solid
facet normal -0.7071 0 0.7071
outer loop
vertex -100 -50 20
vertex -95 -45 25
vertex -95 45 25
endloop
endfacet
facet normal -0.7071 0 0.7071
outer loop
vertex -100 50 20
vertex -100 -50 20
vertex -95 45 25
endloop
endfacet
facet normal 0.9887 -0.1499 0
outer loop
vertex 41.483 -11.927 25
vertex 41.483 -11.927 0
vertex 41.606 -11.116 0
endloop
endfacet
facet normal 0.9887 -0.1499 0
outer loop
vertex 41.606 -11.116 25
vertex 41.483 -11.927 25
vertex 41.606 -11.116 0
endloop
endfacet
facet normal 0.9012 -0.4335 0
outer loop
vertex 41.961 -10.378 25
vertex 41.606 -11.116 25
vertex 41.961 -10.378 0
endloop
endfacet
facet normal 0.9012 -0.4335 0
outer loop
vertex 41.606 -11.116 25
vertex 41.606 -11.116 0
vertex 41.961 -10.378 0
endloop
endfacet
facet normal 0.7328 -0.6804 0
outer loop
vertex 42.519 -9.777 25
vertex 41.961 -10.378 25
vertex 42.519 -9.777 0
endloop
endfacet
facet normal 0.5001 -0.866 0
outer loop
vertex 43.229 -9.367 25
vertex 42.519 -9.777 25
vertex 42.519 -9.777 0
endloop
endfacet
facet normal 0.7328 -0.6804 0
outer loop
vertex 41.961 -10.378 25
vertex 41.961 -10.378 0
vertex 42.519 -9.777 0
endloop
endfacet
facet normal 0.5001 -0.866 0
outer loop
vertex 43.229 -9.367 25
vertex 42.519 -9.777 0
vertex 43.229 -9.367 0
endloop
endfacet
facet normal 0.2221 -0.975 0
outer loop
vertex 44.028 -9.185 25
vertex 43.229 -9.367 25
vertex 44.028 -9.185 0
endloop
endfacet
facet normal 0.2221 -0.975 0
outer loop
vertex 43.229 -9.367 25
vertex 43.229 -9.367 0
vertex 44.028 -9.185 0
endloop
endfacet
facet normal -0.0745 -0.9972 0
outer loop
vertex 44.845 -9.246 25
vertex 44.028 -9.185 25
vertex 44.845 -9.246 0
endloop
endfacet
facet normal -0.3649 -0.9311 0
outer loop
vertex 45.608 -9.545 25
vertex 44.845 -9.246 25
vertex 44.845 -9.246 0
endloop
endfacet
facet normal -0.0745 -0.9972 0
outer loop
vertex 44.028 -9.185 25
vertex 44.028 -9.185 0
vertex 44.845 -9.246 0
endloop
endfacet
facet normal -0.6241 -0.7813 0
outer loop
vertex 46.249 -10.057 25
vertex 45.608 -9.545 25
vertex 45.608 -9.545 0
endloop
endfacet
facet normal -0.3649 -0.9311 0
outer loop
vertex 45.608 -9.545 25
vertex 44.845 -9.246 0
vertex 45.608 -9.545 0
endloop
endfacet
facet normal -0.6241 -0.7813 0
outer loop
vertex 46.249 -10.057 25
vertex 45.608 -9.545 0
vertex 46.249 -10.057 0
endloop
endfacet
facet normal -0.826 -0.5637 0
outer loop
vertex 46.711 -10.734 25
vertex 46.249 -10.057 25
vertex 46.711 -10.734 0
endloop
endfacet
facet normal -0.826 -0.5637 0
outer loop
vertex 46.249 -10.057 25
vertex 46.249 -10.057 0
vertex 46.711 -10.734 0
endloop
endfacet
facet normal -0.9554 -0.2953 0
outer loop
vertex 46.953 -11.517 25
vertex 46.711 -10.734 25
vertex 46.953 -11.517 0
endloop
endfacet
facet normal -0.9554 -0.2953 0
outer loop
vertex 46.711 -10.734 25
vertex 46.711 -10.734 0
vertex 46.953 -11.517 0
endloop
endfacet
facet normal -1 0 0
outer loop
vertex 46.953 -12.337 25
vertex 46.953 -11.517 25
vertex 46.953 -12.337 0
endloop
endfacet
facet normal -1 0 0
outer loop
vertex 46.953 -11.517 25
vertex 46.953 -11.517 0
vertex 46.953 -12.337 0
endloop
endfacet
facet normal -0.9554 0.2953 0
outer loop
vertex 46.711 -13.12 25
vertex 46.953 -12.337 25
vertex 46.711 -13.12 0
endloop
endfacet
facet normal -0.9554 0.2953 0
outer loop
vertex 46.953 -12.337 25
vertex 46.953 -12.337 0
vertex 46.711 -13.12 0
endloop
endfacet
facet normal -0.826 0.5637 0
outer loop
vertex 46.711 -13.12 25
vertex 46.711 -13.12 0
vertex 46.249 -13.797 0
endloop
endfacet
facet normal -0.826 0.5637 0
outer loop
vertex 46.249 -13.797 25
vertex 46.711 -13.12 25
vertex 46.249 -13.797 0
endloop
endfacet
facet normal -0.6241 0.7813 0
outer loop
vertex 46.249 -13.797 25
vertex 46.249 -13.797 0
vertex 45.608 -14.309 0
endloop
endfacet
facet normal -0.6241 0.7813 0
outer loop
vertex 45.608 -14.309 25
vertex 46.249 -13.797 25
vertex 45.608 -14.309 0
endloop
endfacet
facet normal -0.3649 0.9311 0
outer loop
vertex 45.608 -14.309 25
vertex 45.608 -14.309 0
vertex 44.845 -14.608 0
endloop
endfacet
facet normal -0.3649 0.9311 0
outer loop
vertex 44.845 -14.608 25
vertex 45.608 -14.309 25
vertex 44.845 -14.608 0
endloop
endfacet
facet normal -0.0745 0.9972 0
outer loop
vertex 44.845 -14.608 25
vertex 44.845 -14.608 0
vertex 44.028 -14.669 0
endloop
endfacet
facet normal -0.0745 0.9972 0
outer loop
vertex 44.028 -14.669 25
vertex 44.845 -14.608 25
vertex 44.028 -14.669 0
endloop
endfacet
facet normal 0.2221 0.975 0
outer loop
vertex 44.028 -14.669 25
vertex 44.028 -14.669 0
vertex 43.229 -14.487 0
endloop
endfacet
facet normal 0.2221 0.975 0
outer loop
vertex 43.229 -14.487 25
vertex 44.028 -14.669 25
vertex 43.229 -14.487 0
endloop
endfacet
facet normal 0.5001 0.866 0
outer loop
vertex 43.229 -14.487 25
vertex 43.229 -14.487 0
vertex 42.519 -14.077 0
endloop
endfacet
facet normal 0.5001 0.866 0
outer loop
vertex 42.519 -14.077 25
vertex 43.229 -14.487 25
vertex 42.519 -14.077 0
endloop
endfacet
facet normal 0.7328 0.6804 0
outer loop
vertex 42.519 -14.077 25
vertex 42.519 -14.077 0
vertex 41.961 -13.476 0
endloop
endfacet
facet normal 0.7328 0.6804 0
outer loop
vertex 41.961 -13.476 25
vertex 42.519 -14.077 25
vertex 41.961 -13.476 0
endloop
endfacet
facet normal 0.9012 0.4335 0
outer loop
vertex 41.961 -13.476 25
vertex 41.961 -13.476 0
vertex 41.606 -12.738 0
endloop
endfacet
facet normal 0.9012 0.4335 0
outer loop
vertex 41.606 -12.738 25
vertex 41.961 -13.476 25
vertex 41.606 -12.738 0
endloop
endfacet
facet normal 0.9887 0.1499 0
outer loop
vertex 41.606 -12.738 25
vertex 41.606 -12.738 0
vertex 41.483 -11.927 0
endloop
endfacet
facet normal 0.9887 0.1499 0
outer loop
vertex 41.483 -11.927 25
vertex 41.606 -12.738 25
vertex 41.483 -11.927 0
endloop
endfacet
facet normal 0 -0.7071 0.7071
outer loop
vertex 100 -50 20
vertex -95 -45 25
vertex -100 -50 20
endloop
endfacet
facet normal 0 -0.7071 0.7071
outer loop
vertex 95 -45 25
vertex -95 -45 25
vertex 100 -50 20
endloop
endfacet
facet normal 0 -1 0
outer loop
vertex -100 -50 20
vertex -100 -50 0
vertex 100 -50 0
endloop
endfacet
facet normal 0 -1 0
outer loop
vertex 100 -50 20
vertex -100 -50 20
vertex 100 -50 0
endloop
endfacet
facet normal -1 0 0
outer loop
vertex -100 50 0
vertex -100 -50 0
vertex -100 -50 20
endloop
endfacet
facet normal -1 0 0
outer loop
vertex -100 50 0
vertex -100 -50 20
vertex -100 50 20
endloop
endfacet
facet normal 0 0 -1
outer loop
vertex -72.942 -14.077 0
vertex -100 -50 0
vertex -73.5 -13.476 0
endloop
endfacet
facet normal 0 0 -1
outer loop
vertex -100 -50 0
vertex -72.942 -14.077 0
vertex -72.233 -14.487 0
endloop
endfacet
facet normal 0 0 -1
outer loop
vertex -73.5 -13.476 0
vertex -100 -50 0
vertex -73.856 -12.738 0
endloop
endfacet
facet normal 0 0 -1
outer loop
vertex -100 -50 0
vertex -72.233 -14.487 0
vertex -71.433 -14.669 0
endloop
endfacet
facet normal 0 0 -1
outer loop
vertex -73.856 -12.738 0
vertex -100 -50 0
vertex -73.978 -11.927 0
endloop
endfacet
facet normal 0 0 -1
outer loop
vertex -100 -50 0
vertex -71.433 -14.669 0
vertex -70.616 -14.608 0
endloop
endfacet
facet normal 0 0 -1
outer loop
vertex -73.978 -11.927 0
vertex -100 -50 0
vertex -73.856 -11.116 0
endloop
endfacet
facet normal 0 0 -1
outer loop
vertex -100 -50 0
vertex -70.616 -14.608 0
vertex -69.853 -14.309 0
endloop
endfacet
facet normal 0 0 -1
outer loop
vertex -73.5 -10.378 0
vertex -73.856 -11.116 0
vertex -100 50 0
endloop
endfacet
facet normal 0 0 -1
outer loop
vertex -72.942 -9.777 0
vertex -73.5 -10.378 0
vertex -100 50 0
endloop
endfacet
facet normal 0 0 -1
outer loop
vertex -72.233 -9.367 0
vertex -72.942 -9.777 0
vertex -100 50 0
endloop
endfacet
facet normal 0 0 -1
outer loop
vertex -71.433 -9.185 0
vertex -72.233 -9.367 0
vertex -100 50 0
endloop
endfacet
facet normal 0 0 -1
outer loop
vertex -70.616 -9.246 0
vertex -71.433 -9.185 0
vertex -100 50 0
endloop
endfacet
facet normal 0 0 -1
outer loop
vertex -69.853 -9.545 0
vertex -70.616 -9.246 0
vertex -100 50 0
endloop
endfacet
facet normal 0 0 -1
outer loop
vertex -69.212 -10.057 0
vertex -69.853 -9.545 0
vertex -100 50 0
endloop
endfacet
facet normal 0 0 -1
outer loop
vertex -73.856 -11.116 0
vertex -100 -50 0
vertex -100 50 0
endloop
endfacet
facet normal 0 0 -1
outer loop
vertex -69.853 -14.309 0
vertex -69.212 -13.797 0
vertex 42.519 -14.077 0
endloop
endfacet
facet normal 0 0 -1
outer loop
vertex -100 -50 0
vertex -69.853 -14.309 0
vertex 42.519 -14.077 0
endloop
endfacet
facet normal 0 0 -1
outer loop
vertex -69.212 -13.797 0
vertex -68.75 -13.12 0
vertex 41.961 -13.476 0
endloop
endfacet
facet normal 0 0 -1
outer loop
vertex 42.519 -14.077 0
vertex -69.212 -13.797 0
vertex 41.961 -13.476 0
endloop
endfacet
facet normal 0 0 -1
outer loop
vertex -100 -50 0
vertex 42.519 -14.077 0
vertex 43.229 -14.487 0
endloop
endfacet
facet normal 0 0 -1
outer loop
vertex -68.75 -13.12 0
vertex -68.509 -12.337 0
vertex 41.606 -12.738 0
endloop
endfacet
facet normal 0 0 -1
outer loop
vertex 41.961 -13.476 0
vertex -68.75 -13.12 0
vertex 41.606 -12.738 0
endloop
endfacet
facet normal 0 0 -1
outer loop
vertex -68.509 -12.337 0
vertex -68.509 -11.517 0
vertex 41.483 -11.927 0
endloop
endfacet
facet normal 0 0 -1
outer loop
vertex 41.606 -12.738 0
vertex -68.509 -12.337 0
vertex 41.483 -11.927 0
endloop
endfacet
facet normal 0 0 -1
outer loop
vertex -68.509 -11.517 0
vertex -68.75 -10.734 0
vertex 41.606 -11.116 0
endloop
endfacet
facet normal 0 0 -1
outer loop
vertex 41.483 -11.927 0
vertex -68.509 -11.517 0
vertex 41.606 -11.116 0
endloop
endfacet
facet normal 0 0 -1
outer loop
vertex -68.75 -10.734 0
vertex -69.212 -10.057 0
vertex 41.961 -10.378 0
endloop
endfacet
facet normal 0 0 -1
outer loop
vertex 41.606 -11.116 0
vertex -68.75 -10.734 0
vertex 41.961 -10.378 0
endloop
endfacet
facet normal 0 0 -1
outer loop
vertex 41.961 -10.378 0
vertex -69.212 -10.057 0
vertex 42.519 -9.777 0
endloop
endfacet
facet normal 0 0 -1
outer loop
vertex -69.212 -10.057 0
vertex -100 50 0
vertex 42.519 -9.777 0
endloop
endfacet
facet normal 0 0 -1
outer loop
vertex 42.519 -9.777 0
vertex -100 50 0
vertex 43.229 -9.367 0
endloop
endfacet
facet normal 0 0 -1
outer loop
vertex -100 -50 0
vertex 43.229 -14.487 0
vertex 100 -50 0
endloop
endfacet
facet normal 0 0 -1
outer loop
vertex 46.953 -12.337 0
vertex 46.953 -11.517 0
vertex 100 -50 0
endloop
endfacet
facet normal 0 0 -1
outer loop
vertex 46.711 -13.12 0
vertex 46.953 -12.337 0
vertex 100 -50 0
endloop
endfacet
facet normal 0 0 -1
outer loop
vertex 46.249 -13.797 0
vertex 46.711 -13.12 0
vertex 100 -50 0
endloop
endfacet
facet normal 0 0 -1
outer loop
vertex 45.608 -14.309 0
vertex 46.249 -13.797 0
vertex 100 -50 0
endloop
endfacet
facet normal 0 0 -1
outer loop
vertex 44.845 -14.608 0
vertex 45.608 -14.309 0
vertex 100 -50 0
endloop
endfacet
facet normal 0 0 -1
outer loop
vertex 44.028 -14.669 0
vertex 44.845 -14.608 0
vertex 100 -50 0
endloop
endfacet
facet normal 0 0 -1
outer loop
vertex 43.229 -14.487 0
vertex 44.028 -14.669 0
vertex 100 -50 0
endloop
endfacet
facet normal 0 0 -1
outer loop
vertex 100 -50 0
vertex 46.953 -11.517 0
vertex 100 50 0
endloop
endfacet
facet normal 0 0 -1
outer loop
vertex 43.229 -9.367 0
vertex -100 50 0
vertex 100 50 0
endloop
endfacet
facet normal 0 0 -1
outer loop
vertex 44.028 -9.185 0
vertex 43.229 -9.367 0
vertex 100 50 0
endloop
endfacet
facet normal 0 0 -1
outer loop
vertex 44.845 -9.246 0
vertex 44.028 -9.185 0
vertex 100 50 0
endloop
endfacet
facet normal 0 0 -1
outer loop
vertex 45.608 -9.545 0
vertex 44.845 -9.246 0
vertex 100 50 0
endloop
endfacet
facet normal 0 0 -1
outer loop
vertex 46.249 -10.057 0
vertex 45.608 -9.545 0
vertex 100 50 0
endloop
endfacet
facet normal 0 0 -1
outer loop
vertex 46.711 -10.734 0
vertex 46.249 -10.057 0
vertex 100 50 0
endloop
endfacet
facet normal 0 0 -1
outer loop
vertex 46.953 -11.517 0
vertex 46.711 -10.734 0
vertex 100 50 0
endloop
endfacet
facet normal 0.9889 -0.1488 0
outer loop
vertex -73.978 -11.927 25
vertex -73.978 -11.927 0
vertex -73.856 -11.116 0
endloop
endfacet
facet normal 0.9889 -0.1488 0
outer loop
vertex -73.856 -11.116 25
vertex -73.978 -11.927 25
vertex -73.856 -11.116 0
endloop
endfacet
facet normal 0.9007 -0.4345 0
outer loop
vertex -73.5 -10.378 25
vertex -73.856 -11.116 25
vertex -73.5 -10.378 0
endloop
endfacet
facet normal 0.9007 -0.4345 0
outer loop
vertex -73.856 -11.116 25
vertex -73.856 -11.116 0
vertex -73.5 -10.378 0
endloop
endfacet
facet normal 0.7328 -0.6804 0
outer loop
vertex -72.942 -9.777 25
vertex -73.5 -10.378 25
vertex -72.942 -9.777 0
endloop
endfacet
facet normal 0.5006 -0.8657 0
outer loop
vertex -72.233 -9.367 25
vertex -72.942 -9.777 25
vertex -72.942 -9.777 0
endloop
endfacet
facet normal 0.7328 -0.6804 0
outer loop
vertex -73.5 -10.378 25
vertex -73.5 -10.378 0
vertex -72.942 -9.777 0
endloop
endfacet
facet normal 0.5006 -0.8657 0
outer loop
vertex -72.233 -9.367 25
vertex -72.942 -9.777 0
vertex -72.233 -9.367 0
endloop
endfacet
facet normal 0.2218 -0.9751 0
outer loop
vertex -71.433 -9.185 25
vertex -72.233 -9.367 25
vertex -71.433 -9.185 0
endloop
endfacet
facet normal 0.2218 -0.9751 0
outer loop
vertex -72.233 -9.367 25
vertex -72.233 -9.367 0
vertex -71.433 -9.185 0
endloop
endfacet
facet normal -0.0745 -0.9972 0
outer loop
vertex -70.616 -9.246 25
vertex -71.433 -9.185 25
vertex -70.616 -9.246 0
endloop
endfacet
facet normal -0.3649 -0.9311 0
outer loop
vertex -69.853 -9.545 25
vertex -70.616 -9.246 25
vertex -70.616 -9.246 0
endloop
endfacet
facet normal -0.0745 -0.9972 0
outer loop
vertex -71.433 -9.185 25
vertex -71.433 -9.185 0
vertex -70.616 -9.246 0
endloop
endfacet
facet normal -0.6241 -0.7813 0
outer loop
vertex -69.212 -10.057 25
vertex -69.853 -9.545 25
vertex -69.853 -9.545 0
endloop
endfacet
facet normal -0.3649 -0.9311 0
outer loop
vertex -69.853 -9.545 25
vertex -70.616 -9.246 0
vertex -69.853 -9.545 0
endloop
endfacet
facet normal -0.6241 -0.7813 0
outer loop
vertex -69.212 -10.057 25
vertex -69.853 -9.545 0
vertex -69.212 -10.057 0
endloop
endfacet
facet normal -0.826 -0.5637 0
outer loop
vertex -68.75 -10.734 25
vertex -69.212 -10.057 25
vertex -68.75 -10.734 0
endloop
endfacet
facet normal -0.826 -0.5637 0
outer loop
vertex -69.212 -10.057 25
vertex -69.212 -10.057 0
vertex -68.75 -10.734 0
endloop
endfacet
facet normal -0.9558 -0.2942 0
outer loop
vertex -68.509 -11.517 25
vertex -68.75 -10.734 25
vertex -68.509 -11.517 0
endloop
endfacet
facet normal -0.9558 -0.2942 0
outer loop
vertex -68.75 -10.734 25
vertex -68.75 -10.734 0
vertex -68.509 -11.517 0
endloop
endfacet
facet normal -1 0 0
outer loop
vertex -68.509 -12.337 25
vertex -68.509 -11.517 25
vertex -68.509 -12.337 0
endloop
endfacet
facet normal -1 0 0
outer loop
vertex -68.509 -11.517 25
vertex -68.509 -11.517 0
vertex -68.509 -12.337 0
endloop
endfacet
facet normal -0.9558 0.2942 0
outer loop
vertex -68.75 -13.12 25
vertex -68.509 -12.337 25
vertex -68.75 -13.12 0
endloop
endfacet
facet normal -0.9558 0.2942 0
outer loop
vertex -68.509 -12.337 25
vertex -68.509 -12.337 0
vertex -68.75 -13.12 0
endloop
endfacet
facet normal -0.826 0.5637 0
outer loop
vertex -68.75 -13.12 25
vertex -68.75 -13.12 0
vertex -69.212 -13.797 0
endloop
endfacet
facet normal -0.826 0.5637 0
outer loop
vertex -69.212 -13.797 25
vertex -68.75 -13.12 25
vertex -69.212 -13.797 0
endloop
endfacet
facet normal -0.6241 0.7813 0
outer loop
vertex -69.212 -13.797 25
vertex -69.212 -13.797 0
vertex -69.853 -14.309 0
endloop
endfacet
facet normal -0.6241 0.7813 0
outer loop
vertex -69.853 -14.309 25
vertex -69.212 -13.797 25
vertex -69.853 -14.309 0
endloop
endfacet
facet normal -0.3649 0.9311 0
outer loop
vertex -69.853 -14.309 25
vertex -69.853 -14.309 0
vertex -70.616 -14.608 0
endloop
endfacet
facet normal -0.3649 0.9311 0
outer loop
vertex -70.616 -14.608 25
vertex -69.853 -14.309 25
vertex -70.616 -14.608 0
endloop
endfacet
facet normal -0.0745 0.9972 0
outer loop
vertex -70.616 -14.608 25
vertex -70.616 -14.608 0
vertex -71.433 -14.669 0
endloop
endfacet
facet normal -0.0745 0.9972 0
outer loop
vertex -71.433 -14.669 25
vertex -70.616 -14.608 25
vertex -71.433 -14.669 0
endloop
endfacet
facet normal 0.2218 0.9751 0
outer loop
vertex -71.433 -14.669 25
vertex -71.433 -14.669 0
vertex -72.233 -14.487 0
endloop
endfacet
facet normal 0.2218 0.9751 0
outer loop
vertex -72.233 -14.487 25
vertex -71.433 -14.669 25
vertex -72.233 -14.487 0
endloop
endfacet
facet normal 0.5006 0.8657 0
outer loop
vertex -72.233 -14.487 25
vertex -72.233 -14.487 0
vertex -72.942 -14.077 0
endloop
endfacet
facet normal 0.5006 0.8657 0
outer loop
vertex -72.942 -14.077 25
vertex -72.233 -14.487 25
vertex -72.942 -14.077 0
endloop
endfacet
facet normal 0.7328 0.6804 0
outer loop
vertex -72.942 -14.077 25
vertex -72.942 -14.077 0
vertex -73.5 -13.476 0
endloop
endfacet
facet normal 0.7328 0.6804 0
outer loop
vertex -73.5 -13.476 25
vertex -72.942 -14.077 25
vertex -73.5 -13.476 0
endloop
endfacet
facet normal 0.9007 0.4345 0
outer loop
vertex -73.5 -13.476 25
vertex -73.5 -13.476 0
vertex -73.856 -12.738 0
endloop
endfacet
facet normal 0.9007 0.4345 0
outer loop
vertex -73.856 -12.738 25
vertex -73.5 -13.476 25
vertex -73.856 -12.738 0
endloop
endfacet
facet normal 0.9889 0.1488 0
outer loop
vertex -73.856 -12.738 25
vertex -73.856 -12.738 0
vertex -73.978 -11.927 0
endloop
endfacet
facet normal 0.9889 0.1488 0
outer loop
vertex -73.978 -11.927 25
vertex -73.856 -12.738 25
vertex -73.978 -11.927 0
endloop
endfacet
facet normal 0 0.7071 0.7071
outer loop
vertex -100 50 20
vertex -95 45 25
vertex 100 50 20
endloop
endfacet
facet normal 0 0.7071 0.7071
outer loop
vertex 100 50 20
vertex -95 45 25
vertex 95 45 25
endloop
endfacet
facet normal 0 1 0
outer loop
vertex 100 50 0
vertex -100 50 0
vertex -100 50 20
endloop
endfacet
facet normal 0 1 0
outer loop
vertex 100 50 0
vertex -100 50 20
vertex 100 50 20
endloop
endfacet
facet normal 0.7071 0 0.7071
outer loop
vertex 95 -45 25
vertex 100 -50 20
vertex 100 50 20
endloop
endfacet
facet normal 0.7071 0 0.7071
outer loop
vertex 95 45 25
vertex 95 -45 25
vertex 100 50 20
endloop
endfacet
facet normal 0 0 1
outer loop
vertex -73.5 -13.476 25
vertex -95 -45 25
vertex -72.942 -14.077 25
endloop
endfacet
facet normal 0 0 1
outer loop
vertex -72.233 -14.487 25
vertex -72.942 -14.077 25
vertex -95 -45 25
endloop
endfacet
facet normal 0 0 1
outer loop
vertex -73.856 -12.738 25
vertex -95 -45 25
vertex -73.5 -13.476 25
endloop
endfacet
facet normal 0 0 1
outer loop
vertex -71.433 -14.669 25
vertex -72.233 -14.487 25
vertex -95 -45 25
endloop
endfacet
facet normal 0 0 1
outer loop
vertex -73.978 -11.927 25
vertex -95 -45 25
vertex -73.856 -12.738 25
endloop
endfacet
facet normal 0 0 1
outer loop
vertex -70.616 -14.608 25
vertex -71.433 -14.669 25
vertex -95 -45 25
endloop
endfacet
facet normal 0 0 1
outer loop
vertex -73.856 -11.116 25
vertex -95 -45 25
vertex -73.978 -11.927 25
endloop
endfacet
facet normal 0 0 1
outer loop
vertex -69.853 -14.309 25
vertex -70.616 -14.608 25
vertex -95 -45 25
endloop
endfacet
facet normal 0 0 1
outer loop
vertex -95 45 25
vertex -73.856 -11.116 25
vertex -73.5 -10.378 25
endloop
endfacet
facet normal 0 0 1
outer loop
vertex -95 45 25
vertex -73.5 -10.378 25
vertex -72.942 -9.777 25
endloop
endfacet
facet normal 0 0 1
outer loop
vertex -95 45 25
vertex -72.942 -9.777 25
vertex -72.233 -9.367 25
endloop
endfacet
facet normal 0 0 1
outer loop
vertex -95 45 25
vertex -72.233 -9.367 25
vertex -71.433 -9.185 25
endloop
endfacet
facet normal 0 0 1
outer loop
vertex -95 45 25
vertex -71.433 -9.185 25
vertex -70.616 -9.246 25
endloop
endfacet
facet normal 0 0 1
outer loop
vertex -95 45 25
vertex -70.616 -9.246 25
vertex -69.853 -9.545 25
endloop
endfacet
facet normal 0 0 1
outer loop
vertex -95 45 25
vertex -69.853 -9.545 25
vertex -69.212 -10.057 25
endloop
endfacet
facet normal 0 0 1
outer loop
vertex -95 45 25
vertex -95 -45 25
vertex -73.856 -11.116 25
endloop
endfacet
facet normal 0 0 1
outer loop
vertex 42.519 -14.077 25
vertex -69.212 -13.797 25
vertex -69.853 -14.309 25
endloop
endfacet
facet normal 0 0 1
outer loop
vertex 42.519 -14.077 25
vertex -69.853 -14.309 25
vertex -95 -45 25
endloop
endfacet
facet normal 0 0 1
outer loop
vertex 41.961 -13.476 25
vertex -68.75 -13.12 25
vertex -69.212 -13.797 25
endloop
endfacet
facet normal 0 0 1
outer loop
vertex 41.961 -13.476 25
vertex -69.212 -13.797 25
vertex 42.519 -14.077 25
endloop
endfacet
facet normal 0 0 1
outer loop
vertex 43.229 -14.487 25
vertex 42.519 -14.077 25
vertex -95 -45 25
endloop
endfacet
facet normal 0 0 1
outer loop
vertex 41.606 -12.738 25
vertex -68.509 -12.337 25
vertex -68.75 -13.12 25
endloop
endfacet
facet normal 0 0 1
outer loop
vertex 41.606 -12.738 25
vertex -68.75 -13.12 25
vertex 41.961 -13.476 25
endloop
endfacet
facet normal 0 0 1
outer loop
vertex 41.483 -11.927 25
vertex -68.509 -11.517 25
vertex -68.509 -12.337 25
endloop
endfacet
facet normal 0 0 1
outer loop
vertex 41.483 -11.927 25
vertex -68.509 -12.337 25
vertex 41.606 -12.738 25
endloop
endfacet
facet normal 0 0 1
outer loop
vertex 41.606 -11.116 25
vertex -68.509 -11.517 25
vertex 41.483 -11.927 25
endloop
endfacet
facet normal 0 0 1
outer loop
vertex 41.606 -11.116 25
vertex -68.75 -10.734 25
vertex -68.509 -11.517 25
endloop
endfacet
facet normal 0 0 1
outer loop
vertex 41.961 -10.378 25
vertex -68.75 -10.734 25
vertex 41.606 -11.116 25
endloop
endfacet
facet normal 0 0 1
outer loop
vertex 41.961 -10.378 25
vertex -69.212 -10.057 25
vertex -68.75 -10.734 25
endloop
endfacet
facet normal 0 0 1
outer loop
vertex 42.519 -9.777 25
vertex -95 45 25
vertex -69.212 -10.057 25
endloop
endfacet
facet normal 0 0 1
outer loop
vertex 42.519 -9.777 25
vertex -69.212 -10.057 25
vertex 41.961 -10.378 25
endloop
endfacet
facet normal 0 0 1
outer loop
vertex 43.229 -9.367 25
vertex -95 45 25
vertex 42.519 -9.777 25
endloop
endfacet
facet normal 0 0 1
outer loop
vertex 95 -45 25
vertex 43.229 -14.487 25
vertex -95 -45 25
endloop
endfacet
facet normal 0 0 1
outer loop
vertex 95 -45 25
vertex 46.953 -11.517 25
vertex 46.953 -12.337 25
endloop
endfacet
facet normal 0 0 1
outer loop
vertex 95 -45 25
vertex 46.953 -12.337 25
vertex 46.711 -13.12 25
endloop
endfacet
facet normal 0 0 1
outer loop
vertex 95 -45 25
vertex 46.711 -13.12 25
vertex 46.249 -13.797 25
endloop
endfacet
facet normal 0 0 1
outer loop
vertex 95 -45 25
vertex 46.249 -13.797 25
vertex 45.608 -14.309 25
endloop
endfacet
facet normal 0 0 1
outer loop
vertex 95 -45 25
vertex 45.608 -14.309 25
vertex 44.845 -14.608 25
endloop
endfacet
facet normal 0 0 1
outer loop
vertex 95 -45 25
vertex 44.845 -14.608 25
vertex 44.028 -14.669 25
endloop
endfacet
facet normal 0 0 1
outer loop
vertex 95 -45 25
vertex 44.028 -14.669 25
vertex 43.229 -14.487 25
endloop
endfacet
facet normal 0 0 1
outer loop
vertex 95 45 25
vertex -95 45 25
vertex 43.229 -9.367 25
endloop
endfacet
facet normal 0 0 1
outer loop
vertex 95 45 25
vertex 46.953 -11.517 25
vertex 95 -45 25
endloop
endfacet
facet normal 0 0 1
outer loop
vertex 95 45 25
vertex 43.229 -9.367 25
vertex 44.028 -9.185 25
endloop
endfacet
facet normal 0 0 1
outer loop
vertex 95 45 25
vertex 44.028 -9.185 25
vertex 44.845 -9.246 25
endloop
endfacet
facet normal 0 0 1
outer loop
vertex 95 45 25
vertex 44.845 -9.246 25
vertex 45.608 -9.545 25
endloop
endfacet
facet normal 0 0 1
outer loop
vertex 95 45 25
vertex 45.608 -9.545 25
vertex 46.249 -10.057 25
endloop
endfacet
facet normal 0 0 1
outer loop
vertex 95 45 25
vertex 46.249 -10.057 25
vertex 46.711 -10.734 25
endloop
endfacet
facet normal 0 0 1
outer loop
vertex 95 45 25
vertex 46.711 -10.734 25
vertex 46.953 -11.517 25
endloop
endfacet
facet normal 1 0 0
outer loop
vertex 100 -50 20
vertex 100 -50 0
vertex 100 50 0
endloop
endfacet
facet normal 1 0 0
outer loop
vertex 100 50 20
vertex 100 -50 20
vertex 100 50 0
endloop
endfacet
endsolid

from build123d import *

# Parameters (mm, degrees)
F0_W     = 200
F0_H     = 100
F1_DEPTH = 25
F3_D     = 5.5
F4_SIZE  = 5


with BuildPart() as f1:
    # F0 (on Top) → F1 (new body)
    with BuildSketch(Plane.XY):
        Rectangle(F0_W, F0_H)
    extrude(amount=F1_DEPTH)

    # F3 (through all)
    with Locations(Plane.XY.offset(25)):
        with Locations((-71.2278261781, -11.9269927964), (44.2334078252, -11.9269927964)):
            Hole(F3_D / 2)

    # F4
    f4_edges = [f1.edges().sort_by_distance(p)[0] for p in [
        (0, -50, 25),
        (-100, 0, 25),
        (0, 50, 25),
        (100, 0, 25),
    ]]
    chamfer(f4_edges, length=F4_SIZE)


solid = f1.part
